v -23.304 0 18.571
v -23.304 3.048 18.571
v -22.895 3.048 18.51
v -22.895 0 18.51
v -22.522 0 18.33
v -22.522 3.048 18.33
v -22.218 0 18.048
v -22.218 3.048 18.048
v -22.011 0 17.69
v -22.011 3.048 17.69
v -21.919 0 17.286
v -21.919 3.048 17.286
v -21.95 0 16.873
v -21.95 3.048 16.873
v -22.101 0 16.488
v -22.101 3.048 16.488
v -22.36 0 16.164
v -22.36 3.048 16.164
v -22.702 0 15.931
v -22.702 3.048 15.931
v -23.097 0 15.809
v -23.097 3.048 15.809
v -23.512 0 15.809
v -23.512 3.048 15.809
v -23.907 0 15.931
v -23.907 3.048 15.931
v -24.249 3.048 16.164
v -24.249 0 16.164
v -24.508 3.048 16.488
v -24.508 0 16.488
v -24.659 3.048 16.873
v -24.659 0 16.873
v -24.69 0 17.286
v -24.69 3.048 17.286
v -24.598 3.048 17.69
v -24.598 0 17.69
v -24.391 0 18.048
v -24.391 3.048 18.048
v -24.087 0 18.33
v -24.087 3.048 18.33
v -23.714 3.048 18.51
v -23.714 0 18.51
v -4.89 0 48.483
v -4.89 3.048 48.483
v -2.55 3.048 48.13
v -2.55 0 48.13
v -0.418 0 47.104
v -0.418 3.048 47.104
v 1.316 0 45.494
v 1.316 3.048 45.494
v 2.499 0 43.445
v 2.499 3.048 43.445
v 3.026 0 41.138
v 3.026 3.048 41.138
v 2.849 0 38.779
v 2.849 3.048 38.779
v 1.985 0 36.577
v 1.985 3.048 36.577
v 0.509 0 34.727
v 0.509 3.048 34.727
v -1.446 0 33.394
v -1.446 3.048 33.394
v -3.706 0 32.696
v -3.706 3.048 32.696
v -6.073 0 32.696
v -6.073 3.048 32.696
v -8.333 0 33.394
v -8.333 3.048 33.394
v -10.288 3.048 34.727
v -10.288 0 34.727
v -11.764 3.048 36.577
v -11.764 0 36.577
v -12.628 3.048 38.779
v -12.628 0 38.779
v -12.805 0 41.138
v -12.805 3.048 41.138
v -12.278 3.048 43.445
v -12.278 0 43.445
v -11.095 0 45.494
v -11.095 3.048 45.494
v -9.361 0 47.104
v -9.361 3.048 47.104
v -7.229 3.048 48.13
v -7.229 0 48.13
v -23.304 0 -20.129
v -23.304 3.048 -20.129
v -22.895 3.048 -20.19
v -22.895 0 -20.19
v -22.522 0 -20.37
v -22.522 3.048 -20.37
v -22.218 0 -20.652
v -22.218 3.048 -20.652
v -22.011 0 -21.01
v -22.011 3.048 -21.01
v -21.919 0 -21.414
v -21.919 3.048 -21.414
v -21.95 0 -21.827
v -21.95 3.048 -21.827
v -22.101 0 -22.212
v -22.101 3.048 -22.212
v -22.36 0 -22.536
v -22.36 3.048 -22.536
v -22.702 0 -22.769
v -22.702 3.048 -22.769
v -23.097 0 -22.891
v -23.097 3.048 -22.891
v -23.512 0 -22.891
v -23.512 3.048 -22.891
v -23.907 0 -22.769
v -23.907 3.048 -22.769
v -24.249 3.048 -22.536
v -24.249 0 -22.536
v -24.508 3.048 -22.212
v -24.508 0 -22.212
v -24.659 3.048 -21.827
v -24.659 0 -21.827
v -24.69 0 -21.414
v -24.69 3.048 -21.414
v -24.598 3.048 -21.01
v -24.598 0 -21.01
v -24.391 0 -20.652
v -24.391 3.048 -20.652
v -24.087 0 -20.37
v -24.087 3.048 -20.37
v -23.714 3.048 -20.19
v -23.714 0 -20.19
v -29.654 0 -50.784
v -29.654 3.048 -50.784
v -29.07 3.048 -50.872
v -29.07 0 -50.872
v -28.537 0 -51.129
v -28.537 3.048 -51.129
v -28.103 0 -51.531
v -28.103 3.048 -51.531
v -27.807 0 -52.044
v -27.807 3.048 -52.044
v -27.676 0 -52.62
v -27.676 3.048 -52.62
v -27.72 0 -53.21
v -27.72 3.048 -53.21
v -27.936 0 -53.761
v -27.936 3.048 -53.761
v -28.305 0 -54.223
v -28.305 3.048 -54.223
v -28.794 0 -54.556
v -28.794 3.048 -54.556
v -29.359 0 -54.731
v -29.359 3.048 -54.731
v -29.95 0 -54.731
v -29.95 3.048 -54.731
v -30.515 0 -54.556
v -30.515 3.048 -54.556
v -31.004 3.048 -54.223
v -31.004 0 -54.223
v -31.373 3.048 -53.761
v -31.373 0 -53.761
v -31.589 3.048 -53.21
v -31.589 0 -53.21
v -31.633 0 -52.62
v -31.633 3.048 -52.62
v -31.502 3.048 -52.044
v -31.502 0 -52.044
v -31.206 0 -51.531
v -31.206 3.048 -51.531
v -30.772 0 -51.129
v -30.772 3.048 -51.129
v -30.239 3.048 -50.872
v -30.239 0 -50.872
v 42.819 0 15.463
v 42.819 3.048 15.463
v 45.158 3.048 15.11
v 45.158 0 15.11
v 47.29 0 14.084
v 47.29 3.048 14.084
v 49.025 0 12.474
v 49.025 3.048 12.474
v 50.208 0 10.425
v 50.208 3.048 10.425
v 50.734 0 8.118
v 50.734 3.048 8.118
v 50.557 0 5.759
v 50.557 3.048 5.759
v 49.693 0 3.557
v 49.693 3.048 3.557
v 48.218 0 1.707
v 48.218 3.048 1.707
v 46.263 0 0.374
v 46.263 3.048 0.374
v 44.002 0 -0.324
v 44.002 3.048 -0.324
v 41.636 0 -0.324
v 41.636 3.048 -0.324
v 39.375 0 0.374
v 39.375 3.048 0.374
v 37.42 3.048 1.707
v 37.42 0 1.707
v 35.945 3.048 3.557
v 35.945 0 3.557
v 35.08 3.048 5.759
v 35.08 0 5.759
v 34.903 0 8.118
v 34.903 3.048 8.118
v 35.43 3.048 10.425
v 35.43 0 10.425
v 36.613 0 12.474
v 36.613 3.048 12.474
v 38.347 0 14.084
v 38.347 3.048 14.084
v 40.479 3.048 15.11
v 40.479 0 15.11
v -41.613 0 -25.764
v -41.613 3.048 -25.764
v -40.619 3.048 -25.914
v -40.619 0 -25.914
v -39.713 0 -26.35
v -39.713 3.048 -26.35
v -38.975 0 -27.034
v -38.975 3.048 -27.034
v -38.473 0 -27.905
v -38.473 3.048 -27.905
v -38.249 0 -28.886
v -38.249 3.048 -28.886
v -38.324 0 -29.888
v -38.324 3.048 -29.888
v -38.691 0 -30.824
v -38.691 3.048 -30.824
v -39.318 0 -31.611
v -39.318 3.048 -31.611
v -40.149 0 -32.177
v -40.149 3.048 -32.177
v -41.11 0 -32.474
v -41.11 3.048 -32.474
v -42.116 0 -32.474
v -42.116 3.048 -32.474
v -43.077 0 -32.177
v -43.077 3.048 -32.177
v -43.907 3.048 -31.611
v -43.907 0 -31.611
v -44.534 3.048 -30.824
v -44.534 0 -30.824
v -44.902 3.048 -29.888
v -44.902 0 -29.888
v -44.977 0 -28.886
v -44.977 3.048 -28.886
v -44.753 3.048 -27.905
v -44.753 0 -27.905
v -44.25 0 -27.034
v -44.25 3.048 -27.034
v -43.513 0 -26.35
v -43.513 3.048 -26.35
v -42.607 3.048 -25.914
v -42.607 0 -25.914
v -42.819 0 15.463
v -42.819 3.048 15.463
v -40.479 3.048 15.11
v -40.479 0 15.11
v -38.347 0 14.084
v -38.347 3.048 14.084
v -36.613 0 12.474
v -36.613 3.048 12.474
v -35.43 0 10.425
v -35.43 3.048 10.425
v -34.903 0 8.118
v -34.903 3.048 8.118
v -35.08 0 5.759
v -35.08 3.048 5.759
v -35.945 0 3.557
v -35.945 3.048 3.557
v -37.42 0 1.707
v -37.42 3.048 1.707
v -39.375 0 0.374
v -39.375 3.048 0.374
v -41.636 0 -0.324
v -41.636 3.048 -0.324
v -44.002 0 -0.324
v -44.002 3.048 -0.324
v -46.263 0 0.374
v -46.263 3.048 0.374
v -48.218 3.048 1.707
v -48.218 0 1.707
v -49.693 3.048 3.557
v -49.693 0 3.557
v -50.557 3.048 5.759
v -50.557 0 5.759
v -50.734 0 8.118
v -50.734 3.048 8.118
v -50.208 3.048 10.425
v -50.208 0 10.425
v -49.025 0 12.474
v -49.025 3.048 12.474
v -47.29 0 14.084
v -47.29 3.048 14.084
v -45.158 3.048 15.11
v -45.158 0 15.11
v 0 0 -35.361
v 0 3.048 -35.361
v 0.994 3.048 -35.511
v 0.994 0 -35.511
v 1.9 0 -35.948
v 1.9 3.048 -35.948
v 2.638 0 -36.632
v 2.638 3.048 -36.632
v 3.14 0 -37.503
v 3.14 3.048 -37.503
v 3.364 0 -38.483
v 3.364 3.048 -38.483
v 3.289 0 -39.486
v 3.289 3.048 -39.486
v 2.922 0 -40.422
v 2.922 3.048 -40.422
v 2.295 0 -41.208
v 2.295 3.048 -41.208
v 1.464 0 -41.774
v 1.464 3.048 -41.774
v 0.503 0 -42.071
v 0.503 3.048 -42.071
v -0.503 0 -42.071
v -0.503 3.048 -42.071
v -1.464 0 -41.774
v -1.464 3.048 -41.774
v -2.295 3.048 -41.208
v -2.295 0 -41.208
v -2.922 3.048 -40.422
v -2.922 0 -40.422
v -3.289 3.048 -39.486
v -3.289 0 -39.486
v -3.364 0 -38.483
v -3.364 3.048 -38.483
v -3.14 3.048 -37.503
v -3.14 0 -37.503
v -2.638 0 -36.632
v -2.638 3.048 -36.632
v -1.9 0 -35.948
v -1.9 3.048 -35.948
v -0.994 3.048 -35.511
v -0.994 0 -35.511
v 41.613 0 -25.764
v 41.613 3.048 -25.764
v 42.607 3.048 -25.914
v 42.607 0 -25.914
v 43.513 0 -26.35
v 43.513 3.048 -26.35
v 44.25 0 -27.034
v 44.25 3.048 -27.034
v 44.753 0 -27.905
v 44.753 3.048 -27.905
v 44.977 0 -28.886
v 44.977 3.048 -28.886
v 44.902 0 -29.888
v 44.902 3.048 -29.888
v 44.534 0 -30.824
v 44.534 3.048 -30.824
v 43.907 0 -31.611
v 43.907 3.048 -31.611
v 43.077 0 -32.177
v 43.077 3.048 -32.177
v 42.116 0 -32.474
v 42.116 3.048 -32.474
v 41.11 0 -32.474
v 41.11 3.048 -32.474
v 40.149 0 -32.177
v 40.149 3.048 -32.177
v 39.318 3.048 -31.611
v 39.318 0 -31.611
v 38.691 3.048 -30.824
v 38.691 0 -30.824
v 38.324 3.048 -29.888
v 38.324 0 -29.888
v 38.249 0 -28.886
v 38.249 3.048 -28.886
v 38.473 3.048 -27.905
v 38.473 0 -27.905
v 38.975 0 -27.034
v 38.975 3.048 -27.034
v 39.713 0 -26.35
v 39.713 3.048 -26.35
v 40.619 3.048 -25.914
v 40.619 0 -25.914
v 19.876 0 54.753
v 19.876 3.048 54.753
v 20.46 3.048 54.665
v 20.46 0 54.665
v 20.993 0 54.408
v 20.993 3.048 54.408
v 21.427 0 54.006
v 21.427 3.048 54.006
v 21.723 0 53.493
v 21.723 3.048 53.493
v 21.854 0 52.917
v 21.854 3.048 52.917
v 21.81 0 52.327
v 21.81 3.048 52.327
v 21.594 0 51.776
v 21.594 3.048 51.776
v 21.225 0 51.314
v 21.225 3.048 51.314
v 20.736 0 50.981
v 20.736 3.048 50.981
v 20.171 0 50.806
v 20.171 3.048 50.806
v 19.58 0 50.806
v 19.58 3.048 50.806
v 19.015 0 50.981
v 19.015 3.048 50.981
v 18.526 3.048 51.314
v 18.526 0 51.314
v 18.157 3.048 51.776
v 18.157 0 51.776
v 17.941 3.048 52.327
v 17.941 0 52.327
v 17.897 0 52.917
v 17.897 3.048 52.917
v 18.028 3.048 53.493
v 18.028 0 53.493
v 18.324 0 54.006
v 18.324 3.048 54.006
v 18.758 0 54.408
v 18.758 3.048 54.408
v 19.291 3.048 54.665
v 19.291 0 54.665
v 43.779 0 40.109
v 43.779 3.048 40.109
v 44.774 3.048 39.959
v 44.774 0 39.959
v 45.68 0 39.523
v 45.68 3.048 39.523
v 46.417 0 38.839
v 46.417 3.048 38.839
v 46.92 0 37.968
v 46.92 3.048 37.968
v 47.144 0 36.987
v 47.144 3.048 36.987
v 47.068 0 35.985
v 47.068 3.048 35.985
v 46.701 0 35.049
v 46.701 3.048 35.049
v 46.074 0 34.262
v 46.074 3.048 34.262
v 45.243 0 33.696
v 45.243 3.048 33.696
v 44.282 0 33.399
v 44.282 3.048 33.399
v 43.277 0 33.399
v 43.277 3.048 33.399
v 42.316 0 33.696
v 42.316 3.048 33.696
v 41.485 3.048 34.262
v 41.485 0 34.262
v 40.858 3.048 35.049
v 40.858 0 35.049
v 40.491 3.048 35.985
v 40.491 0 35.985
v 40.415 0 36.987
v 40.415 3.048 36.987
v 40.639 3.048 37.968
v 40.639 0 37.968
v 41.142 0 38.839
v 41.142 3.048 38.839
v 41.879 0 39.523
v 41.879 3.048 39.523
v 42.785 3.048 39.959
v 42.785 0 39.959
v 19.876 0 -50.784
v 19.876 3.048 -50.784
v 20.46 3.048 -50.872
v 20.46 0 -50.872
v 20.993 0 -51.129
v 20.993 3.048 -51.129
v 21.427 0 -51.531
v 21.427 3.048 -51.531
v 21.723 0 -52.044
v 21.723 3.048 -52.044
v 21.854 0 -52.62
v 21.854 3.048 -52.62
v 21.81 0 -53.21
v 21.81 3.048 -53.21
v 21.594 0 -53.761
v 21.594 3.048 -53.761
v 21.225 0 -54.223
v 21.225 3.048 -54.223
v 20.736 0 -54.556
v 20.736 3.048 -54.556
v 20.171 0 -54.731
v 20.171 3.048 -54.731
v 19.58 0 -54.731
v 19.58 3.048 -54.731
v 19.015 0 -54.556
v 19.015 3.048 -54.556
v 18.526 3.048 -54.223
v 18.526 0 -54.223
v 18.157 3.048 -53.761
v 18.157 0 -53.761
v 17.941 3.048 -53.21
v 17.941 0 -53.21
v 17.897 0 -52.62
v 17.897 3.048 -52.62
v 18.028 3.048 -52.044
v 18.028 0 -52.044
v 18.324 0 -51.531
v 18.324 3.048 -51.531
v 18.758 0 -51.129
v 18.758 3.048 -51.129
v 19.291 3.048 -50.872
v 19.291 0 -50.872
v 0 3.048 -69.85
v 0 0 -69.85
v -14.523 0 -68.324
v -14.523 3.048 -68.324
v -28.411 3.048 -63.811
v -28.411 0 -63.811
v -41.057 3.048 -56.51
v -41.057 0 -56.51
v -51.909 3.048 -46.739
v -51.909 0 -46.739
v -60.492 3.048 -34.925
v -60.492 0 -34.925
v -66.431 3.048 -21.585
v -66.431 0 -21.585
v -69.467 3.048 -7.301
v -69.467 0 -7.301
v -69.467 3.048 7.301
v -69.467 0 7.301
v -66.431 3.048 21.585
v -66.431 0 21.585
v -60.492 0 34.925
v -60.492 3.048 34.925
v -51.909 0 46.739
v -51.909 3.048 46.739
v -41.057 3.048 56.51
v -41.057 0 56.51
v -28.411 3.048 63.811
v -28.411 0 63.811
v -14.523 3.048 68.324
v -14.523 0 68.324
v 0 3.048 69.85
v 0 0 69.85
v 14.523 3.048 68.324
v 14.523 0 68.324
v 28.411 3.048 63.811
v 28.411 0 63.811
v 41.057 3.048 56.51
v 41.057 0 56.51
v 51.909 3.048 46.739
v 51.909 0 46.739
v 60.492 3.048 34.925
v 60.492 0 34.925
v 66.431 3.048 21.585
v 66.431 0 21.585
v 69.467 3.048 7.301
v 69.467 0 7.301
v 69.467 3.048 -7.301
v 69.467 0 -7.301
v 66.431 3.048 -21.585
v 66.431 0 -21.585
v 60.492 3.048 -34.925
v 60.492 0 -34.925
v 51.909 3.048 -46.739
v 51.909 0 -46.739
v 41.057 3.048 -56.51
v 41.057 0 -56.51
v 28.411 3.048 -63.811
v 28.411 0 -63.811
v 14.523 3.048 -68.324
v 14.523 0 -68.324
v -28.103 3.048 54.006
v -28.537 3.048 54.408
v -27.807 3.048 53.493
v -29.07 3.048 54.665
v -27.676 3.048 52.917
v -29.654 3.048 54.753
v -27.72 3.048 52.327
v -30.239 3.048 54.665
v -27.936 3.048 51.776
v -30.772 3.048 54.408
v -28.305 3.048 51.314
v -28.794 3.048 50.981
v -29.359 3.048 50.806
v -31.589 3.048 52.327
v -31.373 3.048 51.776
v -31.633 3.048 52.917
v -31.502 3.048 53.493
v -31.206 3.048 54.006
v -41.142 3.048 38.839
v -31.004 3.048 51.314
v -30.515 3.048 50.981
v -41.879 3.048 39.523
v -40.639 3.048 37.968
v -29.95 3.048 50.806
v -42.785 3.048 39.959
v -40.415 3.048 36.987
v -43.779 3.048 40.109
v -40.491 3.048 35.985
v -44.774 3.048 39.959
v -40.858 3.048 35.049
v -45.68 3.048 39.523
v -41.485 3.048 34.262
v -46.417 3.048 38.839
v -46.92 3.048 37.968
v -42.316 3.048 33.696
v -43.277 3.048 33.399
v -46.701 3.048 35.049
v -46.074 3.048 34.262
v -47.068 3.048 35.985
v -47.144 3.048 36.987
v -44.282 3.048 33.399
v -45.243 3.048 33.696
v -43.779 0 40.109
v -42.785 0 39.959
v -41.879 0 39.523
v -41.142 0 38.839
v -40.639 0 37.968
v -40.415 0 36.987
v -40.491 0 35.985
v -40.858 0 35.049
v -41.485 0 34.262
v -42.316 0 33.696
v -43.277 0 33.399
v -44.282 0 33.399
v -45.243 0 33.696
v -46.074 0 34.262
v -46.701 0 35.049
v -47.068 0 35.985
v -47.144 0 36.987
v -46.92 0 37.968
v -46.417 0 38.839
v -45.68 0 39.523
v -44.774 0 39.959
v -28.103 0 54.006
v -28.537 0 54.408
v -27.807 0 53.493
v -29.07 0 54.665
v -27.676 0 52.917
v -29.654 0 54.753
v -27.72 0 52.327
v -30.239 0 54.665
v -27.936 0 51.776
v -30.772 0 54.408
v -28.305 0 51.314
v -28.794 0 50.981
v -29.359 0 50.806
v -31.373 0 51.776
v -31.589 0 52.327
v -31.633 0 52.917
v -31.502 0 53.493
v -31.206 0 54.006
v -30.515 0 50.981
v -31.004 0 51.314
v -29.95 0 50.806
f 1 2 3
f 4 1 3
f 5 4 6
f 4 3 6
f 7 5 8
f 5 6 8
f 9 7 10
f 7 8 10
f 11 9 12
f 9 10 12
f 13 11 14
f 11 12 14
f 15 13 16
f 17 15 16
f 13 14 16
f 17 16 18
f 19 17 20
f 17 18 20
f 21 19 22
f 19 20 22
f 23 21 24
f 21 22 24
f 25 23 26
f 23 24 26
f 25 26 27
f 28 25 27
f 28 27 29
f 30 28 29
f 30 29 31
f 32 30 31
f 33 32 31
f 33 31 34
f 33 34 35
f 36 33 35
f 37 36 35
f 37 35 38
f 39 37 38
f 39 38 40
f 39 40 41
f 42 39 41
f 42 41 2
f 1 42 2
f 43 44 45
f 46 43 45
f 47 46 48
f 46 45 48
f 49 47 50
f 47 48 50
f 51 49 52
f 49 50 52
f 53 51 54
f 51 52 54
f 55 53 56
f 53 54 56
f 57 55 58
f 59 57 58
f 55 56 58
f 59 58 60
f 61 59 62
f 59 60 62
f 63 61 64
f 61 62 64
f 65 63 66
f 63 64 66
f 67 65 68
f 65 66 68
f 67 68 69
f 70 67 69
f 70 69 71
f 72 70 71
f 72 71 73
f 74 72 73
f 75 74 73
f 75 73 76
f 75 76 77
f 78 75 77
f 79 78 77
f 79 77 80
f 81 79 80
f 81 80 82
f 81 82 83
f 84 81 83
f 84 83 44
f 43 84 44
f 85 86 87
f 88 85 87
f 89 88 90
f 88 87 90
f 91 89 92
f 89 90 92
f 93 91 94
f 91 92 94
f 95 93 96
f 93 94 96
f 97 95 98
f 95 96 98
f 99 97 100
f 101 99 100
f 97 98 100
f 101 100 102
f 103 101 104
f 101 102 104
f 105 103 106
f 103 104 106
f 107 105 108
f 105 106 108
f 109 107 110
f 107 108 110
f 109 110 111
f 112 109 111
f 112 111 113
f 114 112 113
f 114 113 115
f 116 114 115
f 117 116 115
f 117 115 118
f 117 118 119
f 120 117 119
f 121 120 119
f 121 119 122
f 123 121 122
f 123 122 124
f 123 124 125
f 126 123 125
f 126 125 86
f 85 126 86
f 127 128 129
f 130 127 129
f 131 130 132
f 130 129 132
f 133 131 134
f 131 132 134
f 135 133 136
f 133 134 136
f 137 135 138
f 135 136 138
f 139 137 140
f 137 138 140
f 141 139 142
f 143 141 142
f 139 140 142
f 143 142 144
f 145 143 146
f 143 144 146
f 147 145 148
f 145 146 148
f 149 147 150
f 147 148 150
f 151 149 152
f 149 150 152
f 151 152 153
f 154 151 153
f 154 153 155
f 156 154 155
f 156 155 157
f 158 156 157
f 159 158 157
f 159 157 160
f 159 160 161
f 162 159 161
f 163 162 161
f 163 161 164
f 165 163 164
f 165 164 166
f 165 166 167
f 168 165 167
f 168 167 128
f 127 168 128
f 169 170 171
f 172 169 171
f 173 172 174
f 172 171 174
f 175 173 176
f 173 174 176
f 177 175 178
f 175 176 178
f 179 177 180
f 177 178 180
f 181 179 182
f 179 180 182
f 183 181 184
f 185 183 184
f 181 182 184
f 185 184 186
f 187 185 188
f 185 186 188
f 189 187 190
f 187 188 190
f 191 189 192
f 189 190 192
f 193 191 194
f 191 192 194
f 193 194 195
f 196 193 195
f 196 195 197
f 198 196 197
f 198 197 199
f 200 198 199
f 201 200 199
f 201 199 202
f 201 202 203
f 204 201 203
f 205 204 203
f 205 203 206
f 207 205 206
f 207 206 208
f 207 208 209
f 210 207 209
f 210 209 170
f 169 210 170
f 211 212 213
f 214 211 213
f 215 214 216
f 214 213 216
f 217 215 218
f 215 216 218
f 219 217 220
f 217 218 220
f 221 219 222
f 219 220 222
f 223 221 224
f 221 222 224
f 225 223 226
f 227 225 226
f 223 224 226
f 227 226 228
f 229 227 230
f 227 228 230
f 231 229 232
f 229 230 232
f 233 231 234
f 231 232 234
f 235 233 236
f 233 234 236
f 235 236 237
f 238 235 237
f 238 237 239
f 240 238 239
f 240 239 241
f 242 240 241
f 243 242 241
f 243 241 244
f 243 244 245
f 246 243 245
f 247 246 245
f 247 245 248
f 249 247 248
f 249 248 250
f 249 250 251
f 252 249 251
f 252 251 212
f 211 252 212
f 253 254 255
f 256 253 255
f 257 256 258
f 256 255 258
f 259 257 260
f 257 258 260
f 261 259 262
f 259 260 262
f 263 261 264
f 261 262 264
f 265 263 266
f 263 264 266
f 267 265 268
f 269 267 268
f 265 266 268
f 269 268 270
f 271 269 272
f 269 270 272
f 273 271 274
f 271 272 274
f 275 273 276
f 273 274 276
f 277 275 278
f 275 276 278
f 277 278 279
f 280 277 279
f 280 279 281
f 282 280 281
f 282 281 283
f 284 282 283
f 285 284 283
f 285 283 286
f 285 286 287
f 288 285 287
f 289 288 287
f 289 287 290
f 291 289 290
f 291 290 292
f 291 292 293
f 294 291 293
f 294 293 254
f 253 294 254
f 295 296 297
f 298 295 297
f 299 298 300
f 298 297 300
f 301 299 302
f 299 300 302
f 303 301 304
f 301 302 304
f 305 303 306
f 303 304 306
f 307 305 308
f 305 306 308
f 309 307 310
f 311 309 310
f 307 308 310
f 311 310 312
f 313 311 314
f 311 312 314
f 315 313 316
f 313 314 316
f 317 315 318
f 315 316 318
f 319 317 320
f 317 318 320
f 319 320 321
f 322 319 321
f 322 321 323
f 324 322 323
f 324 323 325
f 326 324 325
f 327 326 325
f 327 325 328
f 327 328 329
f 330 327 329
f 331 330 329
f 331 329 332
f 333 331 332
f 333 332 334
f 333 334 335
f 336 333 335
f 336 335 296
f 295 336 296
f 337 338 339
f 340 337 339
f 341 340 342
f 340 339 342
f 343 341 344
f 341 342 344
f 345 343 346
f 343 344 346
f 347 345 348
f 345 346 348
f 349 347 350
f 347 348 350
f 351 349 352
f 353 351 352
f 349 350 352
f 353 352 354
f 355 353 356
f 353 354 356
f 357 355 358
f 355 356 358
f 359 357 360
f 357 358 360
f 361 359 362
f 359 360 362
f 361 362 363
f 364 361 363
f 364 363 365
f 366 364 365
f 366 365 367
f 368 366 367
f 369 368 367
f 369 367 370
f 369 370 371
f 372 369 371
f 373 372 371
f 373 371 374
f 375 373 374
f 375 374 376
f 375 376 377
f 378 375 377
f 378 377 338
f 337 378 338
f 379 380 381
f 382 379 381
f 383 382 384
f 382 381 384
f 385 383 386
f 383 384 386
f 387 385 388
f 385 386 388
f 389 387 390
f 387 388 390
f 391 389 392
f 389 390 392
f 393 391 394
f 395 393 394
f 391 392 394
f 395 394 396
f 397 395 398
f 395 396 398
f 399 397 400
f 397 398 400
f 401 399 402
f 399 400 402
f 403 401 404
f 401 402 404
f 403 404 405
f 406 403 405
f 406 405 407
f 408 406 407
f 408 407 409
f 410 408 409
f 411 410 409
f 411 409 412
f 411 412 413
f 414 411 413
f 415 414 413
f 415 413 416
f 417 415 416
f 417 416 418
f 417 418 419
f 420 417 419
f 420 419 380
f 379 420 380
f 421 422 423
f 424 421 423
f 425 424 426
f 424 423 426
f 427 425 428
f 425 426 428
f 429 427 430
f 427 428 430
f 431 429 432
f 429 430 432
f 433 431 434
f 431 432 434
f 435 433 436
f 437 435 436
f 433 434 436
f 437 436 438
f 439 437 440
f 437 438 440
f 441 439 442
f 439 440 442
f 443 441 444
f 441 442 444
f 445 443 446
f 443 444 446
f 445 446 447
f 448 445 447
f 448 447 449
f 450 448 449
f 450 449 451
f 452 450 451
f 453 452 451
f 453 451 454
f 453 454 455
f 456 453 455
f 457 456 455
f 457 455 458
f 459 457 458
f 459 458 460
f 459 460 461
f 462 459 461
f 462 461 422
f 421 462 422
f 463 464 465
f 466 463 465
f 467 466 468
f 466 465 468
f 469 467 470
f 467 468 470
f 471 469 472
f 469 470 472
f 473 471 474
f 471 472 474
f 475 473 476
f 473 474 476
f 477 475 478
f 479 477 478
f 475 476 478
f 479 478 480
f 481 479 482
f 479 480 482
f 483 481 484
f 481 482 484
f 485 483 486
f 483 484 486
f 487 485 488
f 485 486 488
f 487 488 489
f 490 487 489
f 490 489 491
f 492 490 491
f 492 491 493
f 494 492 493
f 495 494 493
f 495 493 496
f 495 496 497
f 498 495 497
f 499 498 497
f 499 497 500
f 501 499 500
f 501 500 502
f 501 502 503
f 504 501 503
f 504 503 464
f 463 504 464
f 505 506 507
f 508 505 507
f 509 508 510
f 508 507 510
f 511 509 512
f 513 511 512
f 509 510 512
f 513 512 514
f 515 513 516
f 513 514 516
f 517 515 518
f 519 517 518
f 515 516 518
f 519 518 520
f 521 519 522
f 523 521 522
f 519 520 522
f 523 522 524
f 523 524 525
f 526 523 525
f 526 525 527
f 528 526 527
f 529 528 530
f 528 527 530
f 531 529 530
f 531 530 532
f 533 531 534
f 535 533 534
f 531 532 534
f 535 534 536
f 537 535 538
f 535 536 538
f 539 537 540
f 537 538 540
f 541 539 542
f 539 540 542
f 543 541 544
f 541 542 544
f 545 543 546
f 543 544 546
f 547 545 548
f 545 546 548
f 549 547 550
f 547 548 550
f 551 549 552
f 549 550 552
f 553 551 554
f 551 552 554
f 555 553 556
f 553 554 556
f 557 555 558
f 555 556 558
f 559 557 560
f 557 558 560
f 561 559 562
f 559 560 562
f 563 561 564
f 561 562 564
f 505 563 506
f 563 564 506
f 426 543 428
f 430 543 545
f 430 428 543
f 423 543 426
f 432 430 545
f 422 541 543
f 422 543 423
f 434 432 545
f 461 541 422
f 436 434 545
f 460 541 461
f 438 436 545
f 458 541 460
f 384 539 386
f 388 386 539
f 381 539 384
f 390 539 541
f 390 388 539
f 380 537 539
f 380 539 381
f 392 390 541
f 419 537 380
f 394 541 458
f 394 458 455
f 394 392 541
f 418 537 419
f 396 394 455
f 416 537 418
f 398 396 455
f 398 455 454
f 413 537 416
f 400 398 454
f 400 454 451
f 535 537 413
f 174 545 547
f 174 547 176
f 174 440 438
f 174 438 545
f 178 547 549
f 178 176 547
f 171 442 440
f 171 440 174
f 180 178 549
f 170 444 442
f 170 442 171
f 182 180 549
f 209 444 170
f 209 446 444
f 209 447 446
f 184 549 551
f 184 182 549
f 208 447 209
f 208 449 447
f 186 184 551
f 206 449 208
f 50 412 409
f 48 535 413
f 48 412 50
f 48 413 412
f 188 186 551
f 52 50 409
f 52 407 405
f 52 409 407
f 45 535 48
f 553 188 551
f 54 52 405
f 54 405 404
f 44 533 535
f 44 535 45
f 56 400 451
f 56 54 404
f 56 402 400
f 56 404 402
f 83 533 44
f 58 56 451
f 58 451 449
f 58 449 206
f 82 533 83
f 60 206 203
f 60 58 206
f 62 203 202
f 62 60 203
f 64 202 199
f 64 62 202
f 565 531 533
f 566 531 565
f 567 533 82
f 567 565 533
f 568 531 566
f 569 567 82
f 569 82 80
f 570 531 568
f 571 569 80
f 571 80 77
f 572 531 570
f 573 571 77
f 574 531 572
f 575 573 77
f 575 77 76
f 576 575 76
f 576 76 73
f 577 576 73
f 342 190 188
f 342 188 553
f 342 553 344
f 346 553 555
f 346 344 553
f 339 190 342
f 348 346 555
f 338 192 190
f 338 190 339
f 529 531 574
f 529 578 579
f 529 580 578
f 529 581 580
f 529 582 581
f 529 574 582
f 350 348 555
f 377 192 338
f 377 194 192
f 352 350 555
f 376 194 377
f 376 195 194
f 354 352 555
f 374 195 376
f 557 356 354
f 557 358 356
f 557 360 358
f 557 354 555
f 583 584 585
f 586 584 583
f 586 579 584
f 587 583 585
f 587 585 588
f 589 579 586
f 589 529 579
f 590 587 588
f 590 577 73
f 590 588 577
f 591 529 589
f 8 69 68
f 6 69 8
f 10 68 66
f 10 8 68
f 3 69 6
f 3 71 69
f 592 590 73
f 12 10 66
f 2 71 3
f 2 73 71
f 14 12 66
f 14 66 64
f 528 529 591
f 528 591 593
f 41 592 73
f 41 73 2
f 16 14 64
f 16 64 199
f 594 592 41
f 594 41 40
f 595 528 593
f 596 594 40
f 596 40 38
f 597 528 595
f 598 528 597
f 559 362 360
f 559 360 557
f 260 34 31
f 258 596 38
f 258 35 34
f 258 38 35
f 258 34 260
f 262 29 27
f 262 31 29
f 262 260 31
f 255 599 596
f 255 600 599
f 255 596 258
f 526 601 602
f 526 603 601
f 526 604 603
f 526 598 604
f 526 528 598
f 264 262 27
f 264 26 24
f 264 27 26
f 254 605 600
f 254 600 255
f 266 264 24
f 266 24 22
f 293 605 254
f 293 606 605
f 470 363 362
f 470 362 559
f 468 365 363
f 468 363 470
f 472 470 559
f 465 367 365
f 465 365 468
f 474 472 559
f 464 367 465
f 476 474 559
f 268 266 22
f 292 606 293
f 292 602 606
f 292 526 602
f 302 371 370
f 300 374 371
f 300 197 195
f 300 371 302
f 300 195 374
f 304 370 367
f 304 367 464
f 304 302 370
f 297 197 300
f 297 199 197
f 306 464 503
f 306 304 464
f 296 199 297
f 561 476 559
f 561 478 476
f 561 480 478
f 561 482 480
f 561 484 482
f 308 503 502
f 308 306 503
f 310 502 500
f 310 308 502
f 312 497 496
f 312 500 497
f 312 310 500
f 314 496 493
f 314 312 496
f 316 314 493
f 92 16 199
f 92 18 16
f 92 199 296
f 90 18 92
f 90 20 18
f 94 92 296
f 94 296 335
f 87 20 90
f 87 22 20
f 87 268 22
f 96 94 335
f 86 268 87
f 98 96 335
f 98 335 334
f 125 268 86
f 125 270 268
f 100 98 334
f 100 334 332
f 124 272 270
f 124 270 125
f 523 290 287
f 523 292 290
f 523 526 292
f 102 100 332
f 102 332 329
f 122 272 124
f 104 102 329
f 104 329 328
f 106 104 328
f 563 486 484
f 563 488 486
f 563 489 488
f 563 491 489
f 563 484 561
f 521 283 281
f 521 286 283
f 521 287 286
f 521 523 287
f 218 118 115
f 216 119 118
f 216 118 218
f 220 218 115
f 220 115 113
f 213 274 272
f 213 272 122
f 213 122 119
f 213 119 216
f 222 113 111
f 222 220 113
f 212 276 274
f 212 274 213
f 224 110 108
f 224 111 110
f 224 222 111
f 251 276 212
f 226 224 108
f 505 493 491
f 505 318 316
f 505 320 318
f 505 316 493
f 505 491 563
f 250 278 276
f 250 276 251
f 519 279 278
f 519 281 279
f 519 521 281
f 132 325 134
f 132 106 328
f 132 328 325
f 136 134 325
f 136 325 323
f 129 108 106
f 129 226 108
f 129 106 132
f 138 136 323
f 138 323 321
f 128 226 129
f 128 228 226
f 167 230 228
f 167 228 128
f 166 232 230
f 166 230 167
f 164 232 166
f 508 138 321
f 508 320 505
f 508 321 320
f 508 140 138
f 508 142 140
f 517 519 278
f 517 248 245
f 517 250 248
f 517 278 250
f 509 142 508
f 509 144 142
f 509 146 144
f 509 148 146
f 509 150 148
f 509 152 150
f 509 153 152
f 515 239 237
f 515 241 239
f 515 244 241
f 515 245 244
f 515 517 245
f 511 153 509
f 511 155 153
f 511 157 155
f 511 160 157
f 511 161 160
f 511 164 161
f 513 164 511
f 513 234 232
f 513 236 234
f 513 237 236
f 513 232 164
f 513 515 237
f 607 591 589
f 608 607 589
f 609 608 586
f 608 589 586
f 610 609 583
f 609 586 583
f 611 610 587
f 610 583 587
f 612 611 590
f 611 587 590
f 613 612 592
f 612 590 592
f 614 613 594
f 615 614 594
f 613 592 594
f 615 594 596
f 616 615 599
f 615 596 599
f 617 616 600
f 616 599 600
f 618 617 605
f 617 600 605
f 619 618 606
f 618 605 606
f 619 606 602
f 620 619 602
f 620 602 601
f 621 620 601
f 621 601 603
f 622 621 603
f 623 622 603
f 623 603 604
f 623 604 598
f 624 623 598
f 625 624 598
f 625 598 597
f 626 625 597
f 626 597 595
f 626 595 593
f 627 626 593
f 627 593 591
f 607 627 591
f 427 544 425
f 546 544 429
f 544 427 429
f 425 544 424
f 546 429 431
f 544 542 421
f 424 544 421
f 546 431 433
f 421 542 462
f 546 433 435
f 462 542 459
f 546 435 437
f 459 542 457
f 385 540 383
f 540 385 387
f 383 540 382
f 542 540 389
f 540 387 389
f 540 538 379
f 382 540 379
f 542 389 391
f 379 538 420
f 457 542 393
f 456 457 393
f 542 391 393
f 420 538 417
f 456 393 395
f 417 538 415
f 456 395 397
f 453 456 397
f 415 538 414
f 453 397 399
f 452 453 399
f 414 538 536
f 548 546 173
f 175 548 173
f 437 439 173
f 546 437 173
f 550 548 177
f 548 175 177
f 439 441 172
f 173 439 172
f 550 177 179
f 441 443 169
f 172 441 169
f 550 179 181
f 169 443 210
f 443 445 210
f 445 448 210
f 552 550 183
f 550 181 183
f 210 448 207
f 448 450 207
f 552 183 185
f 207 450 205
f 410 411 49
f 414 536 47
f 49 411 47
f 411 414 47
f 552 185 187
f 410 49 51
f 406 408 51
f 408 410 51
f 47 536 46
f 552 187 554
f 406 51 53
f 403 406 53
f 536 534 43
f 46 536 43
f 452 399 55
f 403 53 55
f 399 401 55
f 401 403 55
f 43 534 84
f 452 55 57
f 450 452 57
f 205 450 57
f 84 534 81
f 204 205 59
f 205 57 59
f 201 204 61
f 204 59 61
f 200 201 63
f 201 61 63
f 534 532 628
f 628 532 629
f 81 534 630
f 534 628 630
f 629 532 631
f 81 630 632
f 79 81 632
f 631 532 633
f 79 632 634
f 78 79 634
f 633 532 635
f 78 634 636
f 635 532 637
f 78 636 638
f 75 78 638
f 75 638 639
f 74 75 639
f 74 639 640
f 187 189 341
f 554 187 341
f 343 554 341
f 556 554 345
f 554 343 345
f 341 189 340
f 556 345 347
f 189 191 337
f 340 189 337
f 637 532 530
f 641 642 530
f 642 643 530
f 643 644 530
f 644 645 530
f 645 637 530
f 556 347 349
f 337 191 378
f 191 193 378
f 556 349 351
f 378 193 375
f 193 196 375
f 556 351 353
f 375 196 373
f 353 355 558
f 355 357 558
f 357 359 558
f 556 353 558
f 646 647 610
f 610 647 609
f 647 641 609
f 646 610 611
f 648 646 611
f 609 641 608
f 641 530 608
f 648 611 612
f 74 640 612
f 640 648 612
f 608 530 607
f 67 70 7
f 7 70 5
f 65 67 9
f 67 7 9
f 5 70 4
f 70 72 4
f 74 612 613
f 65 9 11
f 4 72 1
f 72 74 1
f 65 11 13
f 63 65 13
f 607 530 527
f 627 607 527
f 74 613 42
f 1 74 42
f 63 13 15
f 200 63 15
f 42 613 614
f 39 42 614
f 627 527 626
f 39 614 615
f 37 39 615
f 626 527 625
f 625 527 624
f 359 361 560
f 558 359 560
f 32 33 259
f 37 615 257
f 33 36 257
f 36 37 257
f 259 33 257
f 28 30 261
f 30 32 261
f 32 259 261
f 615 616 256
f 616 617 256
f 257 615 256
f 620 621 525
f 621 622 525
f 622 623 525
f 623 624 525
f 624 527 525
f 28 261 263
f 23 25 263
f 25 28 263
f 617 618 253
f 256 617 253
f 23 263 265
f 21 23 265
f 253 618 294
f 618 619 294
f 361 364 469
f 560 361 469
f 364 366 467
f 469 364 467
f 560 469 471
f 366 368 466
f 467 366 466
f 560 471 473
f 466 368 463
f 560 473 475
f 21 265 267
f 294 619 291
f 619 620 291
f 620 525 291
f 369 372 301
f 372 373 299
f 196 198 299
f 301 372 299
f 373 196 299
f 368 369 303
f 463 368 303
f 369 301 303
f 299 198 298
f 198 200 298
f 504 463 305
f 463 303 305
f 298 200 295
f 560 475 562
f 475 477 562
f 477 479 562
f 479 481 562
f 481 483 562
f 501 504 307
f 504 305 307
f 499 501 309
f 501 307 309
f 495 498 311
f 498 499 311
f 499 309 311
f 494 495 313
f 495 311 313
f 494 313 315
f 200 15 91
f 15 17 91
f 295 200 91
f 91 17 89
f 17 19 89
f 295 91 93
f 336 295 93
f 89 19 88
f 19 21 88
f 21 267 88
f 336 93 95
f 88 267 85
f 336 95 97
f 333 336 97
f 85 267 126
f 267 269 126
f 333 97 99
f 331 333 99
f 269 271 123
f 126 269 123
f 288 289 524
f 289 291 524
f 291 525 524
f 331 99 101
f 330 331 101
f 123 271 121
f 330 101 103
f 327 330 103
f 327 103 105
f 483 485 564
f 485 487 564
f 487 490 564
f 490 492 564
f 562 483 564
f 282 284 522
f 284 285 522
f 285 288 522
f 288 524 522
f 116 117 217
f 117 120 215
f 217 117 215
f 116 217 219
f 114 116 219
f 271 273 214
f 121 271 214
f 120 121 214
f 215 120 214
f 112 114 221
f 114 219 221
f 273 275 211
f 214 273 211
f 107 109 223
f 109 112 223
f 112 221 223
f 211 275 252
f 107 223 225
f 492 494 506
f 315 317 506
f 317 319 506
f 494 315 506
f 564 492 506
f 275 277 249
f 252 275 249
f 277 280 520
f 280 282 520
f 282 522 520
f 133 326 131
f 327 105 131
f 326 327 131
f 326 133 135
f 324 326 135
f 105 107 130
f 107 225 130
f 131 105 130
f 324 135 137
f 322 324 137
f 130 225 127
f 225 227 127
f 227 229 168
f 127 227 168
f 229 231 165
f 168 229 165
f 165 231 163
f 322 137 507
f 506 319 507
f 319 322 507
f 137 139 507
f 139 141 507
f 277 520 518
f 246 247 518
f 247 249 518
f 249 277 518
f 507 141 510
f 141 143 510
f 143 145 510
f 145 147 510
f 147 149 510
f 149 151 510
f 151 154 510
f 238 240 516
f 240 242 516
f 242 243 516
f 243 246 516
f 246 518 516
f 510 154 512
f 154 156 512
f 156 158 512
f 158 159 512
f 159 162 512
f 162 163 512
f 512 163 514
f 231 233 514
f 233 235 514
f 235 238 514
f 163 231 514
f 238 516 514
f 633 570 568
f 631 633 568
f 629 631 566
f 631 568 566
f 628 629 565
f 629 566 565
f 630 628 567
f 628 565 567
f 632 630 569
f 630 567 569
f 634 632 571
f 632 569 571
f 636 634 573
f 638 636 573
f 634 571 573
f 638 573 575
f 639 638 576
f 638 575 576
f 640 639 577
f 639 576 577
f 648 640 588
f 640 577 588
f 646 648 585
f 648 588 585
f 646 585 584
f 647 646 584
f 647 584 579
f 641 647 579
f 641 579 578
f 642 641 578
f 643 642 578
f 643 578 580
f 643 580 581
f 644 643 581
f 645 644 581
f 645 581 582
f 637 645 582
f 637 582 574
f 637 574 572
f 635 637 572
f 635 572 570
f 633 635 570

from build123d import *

# Parameters (mm, degrees)
SKETCH1_R                            = 69.85
BOSS_EXTRUDE1_DEPTH                  = 3.048
F_17_64_0_26563_DIAMETER_HOLE1_D     = 6.747002
F_17_64_0_26563_DIAMETER_HOLE1_DEPTH = 16.51
F_17_64_0_26563_DIAMETER_HOLE1_TIP   = 2.027003899
F_5_32_0_15625_DIAMETER_HOLE1_D      = 3.96875
F_5_32_0_15625_DIAMETER_HOLE1_DEPTH  = 16.51
F_5_32_0_15625_DIAMETER_HOLE1_TIP    = 1.192332791
F_5_8_0_625_DIAMETER_HOLE1_D         = 15.875
F_5_8_0_625_DIAMETER_HOLE1_DEPTH     = 16.51
F_5_8_0_625_DIAMETER_HOLE1_TIP       = 4.769331164
F_7_64_0_10938_DIAMETER_HOLE1_D      = 2.778252
F_7_64_0_10938_DIAMETER_HOLE1_DEPTH  = 16.51
F_7_64_0_10938_DIAMETER_HOLE1_TIP    = 0.834671108


with BuildPart() as part:
    # Sketch1 → Boss-Extrude1 (new body)
    with BuildSketch(Plane(origin=(0, 0, 0), x_dir=(1, 0, 0), z_dir=(0, 1, 0))):
        with Locations(Location((0, 0, 0), (0, 0, 90))):
            Circle(SKETCH1_R)
    extrude(amount=BOSS_EXTRUDE1_DEPTH)

    # 17/64 (0.26563) Diameter Hole1
    with Locations(Plane(origin=(-43.779439924, 0, 36.735311894), x_dir=(0, 0, -1), z_dir=(0, -1, 0))):
        with Locations((0, 0), (0, 87.558879848), (65.872994861, 85.392363774), (65.872994861, 2.166516074), (75.470311894, 43.779439924)):
            Hole(F_17_64_0_26563_DIAMETER_HOLE1_D / 2, depth=F_17_64_0_26563_DIAMETER_HOLE1_DEPTH)
            with Locations((0, 0, -(F_17_64_0_26563_DIAMETER_HOLE1_DEPTH + F_17_64_0_26563_DIAMETER_HOLE1_TIP / 2))):  # 118° drill point
                Cone(0, F_17_64_0_26563_DIAMETER_HOLE1_D / 2, F_17_64_0_26563_DIAMETER_HOLE1_TIP, mode=Mode.SUBTRACT)

    # 5/32 (0.15625) Diameter Hole1
    with Locations(Plane(origin=(-29.6545, 0, 52.7685), x_dir=(0, 0, -1), z_dir=(0, -1, 0))):
        with Locations((0, 0), (0, 49.53), (105.537, 49.53), (105.537, 0)):
            Hole(F_5_32_0_15625_DIAMETER_HOLE1_D / 2, depth=F_5_32_0_15625_DIAMETER_HOLE1_DEPTH)
            with Locations((0, 0, -(F_5_32_0_15625_DIAMETER_HOLE1_DEPTH + F_5_32_0_15625_DIAMETER_HOLE1_TIP / 2))):  # 118° drill point
                Cone(0, F_5_32_0_15625_DIAMETER_HOLE1_D / 2, F_5_32_0_15625_DIAMETER_HOLE1_TIP, mode=Mode.SUBTRACT)

    # 5/8 (0.625) Diameter Hole1
    with Locations(Plane(origin=(-42.818743744, 0, 7.525311894), x_dir=(0, 0, -1), z_dir=(0, -1, 0))):
        with Locations((0, 0), (-33.02, 37.929243744), (0, 85.637487488)):
            Hole(F_5_8_0_625_DIAMETER_HOLE1_D / 2, depth=F_5_8_0_625_DIAMETER_HOLE1_DEPTH)
            with Locations((0, 0, -(F_5_8_0_625_DIAMETER_HOLE1_DEPTH + F_5_8_0_625_DIAMETER_HOLE1_TIP / 2))):  # 118° drill point
                Cone(0, F_5_8_0_625_DIAMETER_HOLE1_D / 2, F_5_8_0_625_DIAMETER_HOLE1_TIP, mode=Mode.SUBTRACT)

    # 7/64 (0.10938) Diameter Hole1
    with Locations(Plane(origin=(-23.3045, 0, 17.182317033), x_dir=(0, 0, -1), z_dir=(0, -1, 0))):
        with Locations((0, 0), (38.7, 0)):
            Hole(F_7_64_0_10938_DIAMETER_HOLE1_D / 2, depth=F_7_64_0_10938_DIAMETER_HOLE1_DEPTH)
            with Locations((0, 0, -(F_7_64_0_10938_DIAMETER_HOLE1_DEPTH + F_7_64_0_10938_DIAMETER_HOLE1_TIP / 2))):  # 118° drill point
                Cone(0, F_7_64_0_10938_DIAMETER_HOLE1_D / 2, F_7_64_0_10938_DIAMETER_HOLE1_TIP, mode=Mode.SUBTRACT)


solid = part.part
